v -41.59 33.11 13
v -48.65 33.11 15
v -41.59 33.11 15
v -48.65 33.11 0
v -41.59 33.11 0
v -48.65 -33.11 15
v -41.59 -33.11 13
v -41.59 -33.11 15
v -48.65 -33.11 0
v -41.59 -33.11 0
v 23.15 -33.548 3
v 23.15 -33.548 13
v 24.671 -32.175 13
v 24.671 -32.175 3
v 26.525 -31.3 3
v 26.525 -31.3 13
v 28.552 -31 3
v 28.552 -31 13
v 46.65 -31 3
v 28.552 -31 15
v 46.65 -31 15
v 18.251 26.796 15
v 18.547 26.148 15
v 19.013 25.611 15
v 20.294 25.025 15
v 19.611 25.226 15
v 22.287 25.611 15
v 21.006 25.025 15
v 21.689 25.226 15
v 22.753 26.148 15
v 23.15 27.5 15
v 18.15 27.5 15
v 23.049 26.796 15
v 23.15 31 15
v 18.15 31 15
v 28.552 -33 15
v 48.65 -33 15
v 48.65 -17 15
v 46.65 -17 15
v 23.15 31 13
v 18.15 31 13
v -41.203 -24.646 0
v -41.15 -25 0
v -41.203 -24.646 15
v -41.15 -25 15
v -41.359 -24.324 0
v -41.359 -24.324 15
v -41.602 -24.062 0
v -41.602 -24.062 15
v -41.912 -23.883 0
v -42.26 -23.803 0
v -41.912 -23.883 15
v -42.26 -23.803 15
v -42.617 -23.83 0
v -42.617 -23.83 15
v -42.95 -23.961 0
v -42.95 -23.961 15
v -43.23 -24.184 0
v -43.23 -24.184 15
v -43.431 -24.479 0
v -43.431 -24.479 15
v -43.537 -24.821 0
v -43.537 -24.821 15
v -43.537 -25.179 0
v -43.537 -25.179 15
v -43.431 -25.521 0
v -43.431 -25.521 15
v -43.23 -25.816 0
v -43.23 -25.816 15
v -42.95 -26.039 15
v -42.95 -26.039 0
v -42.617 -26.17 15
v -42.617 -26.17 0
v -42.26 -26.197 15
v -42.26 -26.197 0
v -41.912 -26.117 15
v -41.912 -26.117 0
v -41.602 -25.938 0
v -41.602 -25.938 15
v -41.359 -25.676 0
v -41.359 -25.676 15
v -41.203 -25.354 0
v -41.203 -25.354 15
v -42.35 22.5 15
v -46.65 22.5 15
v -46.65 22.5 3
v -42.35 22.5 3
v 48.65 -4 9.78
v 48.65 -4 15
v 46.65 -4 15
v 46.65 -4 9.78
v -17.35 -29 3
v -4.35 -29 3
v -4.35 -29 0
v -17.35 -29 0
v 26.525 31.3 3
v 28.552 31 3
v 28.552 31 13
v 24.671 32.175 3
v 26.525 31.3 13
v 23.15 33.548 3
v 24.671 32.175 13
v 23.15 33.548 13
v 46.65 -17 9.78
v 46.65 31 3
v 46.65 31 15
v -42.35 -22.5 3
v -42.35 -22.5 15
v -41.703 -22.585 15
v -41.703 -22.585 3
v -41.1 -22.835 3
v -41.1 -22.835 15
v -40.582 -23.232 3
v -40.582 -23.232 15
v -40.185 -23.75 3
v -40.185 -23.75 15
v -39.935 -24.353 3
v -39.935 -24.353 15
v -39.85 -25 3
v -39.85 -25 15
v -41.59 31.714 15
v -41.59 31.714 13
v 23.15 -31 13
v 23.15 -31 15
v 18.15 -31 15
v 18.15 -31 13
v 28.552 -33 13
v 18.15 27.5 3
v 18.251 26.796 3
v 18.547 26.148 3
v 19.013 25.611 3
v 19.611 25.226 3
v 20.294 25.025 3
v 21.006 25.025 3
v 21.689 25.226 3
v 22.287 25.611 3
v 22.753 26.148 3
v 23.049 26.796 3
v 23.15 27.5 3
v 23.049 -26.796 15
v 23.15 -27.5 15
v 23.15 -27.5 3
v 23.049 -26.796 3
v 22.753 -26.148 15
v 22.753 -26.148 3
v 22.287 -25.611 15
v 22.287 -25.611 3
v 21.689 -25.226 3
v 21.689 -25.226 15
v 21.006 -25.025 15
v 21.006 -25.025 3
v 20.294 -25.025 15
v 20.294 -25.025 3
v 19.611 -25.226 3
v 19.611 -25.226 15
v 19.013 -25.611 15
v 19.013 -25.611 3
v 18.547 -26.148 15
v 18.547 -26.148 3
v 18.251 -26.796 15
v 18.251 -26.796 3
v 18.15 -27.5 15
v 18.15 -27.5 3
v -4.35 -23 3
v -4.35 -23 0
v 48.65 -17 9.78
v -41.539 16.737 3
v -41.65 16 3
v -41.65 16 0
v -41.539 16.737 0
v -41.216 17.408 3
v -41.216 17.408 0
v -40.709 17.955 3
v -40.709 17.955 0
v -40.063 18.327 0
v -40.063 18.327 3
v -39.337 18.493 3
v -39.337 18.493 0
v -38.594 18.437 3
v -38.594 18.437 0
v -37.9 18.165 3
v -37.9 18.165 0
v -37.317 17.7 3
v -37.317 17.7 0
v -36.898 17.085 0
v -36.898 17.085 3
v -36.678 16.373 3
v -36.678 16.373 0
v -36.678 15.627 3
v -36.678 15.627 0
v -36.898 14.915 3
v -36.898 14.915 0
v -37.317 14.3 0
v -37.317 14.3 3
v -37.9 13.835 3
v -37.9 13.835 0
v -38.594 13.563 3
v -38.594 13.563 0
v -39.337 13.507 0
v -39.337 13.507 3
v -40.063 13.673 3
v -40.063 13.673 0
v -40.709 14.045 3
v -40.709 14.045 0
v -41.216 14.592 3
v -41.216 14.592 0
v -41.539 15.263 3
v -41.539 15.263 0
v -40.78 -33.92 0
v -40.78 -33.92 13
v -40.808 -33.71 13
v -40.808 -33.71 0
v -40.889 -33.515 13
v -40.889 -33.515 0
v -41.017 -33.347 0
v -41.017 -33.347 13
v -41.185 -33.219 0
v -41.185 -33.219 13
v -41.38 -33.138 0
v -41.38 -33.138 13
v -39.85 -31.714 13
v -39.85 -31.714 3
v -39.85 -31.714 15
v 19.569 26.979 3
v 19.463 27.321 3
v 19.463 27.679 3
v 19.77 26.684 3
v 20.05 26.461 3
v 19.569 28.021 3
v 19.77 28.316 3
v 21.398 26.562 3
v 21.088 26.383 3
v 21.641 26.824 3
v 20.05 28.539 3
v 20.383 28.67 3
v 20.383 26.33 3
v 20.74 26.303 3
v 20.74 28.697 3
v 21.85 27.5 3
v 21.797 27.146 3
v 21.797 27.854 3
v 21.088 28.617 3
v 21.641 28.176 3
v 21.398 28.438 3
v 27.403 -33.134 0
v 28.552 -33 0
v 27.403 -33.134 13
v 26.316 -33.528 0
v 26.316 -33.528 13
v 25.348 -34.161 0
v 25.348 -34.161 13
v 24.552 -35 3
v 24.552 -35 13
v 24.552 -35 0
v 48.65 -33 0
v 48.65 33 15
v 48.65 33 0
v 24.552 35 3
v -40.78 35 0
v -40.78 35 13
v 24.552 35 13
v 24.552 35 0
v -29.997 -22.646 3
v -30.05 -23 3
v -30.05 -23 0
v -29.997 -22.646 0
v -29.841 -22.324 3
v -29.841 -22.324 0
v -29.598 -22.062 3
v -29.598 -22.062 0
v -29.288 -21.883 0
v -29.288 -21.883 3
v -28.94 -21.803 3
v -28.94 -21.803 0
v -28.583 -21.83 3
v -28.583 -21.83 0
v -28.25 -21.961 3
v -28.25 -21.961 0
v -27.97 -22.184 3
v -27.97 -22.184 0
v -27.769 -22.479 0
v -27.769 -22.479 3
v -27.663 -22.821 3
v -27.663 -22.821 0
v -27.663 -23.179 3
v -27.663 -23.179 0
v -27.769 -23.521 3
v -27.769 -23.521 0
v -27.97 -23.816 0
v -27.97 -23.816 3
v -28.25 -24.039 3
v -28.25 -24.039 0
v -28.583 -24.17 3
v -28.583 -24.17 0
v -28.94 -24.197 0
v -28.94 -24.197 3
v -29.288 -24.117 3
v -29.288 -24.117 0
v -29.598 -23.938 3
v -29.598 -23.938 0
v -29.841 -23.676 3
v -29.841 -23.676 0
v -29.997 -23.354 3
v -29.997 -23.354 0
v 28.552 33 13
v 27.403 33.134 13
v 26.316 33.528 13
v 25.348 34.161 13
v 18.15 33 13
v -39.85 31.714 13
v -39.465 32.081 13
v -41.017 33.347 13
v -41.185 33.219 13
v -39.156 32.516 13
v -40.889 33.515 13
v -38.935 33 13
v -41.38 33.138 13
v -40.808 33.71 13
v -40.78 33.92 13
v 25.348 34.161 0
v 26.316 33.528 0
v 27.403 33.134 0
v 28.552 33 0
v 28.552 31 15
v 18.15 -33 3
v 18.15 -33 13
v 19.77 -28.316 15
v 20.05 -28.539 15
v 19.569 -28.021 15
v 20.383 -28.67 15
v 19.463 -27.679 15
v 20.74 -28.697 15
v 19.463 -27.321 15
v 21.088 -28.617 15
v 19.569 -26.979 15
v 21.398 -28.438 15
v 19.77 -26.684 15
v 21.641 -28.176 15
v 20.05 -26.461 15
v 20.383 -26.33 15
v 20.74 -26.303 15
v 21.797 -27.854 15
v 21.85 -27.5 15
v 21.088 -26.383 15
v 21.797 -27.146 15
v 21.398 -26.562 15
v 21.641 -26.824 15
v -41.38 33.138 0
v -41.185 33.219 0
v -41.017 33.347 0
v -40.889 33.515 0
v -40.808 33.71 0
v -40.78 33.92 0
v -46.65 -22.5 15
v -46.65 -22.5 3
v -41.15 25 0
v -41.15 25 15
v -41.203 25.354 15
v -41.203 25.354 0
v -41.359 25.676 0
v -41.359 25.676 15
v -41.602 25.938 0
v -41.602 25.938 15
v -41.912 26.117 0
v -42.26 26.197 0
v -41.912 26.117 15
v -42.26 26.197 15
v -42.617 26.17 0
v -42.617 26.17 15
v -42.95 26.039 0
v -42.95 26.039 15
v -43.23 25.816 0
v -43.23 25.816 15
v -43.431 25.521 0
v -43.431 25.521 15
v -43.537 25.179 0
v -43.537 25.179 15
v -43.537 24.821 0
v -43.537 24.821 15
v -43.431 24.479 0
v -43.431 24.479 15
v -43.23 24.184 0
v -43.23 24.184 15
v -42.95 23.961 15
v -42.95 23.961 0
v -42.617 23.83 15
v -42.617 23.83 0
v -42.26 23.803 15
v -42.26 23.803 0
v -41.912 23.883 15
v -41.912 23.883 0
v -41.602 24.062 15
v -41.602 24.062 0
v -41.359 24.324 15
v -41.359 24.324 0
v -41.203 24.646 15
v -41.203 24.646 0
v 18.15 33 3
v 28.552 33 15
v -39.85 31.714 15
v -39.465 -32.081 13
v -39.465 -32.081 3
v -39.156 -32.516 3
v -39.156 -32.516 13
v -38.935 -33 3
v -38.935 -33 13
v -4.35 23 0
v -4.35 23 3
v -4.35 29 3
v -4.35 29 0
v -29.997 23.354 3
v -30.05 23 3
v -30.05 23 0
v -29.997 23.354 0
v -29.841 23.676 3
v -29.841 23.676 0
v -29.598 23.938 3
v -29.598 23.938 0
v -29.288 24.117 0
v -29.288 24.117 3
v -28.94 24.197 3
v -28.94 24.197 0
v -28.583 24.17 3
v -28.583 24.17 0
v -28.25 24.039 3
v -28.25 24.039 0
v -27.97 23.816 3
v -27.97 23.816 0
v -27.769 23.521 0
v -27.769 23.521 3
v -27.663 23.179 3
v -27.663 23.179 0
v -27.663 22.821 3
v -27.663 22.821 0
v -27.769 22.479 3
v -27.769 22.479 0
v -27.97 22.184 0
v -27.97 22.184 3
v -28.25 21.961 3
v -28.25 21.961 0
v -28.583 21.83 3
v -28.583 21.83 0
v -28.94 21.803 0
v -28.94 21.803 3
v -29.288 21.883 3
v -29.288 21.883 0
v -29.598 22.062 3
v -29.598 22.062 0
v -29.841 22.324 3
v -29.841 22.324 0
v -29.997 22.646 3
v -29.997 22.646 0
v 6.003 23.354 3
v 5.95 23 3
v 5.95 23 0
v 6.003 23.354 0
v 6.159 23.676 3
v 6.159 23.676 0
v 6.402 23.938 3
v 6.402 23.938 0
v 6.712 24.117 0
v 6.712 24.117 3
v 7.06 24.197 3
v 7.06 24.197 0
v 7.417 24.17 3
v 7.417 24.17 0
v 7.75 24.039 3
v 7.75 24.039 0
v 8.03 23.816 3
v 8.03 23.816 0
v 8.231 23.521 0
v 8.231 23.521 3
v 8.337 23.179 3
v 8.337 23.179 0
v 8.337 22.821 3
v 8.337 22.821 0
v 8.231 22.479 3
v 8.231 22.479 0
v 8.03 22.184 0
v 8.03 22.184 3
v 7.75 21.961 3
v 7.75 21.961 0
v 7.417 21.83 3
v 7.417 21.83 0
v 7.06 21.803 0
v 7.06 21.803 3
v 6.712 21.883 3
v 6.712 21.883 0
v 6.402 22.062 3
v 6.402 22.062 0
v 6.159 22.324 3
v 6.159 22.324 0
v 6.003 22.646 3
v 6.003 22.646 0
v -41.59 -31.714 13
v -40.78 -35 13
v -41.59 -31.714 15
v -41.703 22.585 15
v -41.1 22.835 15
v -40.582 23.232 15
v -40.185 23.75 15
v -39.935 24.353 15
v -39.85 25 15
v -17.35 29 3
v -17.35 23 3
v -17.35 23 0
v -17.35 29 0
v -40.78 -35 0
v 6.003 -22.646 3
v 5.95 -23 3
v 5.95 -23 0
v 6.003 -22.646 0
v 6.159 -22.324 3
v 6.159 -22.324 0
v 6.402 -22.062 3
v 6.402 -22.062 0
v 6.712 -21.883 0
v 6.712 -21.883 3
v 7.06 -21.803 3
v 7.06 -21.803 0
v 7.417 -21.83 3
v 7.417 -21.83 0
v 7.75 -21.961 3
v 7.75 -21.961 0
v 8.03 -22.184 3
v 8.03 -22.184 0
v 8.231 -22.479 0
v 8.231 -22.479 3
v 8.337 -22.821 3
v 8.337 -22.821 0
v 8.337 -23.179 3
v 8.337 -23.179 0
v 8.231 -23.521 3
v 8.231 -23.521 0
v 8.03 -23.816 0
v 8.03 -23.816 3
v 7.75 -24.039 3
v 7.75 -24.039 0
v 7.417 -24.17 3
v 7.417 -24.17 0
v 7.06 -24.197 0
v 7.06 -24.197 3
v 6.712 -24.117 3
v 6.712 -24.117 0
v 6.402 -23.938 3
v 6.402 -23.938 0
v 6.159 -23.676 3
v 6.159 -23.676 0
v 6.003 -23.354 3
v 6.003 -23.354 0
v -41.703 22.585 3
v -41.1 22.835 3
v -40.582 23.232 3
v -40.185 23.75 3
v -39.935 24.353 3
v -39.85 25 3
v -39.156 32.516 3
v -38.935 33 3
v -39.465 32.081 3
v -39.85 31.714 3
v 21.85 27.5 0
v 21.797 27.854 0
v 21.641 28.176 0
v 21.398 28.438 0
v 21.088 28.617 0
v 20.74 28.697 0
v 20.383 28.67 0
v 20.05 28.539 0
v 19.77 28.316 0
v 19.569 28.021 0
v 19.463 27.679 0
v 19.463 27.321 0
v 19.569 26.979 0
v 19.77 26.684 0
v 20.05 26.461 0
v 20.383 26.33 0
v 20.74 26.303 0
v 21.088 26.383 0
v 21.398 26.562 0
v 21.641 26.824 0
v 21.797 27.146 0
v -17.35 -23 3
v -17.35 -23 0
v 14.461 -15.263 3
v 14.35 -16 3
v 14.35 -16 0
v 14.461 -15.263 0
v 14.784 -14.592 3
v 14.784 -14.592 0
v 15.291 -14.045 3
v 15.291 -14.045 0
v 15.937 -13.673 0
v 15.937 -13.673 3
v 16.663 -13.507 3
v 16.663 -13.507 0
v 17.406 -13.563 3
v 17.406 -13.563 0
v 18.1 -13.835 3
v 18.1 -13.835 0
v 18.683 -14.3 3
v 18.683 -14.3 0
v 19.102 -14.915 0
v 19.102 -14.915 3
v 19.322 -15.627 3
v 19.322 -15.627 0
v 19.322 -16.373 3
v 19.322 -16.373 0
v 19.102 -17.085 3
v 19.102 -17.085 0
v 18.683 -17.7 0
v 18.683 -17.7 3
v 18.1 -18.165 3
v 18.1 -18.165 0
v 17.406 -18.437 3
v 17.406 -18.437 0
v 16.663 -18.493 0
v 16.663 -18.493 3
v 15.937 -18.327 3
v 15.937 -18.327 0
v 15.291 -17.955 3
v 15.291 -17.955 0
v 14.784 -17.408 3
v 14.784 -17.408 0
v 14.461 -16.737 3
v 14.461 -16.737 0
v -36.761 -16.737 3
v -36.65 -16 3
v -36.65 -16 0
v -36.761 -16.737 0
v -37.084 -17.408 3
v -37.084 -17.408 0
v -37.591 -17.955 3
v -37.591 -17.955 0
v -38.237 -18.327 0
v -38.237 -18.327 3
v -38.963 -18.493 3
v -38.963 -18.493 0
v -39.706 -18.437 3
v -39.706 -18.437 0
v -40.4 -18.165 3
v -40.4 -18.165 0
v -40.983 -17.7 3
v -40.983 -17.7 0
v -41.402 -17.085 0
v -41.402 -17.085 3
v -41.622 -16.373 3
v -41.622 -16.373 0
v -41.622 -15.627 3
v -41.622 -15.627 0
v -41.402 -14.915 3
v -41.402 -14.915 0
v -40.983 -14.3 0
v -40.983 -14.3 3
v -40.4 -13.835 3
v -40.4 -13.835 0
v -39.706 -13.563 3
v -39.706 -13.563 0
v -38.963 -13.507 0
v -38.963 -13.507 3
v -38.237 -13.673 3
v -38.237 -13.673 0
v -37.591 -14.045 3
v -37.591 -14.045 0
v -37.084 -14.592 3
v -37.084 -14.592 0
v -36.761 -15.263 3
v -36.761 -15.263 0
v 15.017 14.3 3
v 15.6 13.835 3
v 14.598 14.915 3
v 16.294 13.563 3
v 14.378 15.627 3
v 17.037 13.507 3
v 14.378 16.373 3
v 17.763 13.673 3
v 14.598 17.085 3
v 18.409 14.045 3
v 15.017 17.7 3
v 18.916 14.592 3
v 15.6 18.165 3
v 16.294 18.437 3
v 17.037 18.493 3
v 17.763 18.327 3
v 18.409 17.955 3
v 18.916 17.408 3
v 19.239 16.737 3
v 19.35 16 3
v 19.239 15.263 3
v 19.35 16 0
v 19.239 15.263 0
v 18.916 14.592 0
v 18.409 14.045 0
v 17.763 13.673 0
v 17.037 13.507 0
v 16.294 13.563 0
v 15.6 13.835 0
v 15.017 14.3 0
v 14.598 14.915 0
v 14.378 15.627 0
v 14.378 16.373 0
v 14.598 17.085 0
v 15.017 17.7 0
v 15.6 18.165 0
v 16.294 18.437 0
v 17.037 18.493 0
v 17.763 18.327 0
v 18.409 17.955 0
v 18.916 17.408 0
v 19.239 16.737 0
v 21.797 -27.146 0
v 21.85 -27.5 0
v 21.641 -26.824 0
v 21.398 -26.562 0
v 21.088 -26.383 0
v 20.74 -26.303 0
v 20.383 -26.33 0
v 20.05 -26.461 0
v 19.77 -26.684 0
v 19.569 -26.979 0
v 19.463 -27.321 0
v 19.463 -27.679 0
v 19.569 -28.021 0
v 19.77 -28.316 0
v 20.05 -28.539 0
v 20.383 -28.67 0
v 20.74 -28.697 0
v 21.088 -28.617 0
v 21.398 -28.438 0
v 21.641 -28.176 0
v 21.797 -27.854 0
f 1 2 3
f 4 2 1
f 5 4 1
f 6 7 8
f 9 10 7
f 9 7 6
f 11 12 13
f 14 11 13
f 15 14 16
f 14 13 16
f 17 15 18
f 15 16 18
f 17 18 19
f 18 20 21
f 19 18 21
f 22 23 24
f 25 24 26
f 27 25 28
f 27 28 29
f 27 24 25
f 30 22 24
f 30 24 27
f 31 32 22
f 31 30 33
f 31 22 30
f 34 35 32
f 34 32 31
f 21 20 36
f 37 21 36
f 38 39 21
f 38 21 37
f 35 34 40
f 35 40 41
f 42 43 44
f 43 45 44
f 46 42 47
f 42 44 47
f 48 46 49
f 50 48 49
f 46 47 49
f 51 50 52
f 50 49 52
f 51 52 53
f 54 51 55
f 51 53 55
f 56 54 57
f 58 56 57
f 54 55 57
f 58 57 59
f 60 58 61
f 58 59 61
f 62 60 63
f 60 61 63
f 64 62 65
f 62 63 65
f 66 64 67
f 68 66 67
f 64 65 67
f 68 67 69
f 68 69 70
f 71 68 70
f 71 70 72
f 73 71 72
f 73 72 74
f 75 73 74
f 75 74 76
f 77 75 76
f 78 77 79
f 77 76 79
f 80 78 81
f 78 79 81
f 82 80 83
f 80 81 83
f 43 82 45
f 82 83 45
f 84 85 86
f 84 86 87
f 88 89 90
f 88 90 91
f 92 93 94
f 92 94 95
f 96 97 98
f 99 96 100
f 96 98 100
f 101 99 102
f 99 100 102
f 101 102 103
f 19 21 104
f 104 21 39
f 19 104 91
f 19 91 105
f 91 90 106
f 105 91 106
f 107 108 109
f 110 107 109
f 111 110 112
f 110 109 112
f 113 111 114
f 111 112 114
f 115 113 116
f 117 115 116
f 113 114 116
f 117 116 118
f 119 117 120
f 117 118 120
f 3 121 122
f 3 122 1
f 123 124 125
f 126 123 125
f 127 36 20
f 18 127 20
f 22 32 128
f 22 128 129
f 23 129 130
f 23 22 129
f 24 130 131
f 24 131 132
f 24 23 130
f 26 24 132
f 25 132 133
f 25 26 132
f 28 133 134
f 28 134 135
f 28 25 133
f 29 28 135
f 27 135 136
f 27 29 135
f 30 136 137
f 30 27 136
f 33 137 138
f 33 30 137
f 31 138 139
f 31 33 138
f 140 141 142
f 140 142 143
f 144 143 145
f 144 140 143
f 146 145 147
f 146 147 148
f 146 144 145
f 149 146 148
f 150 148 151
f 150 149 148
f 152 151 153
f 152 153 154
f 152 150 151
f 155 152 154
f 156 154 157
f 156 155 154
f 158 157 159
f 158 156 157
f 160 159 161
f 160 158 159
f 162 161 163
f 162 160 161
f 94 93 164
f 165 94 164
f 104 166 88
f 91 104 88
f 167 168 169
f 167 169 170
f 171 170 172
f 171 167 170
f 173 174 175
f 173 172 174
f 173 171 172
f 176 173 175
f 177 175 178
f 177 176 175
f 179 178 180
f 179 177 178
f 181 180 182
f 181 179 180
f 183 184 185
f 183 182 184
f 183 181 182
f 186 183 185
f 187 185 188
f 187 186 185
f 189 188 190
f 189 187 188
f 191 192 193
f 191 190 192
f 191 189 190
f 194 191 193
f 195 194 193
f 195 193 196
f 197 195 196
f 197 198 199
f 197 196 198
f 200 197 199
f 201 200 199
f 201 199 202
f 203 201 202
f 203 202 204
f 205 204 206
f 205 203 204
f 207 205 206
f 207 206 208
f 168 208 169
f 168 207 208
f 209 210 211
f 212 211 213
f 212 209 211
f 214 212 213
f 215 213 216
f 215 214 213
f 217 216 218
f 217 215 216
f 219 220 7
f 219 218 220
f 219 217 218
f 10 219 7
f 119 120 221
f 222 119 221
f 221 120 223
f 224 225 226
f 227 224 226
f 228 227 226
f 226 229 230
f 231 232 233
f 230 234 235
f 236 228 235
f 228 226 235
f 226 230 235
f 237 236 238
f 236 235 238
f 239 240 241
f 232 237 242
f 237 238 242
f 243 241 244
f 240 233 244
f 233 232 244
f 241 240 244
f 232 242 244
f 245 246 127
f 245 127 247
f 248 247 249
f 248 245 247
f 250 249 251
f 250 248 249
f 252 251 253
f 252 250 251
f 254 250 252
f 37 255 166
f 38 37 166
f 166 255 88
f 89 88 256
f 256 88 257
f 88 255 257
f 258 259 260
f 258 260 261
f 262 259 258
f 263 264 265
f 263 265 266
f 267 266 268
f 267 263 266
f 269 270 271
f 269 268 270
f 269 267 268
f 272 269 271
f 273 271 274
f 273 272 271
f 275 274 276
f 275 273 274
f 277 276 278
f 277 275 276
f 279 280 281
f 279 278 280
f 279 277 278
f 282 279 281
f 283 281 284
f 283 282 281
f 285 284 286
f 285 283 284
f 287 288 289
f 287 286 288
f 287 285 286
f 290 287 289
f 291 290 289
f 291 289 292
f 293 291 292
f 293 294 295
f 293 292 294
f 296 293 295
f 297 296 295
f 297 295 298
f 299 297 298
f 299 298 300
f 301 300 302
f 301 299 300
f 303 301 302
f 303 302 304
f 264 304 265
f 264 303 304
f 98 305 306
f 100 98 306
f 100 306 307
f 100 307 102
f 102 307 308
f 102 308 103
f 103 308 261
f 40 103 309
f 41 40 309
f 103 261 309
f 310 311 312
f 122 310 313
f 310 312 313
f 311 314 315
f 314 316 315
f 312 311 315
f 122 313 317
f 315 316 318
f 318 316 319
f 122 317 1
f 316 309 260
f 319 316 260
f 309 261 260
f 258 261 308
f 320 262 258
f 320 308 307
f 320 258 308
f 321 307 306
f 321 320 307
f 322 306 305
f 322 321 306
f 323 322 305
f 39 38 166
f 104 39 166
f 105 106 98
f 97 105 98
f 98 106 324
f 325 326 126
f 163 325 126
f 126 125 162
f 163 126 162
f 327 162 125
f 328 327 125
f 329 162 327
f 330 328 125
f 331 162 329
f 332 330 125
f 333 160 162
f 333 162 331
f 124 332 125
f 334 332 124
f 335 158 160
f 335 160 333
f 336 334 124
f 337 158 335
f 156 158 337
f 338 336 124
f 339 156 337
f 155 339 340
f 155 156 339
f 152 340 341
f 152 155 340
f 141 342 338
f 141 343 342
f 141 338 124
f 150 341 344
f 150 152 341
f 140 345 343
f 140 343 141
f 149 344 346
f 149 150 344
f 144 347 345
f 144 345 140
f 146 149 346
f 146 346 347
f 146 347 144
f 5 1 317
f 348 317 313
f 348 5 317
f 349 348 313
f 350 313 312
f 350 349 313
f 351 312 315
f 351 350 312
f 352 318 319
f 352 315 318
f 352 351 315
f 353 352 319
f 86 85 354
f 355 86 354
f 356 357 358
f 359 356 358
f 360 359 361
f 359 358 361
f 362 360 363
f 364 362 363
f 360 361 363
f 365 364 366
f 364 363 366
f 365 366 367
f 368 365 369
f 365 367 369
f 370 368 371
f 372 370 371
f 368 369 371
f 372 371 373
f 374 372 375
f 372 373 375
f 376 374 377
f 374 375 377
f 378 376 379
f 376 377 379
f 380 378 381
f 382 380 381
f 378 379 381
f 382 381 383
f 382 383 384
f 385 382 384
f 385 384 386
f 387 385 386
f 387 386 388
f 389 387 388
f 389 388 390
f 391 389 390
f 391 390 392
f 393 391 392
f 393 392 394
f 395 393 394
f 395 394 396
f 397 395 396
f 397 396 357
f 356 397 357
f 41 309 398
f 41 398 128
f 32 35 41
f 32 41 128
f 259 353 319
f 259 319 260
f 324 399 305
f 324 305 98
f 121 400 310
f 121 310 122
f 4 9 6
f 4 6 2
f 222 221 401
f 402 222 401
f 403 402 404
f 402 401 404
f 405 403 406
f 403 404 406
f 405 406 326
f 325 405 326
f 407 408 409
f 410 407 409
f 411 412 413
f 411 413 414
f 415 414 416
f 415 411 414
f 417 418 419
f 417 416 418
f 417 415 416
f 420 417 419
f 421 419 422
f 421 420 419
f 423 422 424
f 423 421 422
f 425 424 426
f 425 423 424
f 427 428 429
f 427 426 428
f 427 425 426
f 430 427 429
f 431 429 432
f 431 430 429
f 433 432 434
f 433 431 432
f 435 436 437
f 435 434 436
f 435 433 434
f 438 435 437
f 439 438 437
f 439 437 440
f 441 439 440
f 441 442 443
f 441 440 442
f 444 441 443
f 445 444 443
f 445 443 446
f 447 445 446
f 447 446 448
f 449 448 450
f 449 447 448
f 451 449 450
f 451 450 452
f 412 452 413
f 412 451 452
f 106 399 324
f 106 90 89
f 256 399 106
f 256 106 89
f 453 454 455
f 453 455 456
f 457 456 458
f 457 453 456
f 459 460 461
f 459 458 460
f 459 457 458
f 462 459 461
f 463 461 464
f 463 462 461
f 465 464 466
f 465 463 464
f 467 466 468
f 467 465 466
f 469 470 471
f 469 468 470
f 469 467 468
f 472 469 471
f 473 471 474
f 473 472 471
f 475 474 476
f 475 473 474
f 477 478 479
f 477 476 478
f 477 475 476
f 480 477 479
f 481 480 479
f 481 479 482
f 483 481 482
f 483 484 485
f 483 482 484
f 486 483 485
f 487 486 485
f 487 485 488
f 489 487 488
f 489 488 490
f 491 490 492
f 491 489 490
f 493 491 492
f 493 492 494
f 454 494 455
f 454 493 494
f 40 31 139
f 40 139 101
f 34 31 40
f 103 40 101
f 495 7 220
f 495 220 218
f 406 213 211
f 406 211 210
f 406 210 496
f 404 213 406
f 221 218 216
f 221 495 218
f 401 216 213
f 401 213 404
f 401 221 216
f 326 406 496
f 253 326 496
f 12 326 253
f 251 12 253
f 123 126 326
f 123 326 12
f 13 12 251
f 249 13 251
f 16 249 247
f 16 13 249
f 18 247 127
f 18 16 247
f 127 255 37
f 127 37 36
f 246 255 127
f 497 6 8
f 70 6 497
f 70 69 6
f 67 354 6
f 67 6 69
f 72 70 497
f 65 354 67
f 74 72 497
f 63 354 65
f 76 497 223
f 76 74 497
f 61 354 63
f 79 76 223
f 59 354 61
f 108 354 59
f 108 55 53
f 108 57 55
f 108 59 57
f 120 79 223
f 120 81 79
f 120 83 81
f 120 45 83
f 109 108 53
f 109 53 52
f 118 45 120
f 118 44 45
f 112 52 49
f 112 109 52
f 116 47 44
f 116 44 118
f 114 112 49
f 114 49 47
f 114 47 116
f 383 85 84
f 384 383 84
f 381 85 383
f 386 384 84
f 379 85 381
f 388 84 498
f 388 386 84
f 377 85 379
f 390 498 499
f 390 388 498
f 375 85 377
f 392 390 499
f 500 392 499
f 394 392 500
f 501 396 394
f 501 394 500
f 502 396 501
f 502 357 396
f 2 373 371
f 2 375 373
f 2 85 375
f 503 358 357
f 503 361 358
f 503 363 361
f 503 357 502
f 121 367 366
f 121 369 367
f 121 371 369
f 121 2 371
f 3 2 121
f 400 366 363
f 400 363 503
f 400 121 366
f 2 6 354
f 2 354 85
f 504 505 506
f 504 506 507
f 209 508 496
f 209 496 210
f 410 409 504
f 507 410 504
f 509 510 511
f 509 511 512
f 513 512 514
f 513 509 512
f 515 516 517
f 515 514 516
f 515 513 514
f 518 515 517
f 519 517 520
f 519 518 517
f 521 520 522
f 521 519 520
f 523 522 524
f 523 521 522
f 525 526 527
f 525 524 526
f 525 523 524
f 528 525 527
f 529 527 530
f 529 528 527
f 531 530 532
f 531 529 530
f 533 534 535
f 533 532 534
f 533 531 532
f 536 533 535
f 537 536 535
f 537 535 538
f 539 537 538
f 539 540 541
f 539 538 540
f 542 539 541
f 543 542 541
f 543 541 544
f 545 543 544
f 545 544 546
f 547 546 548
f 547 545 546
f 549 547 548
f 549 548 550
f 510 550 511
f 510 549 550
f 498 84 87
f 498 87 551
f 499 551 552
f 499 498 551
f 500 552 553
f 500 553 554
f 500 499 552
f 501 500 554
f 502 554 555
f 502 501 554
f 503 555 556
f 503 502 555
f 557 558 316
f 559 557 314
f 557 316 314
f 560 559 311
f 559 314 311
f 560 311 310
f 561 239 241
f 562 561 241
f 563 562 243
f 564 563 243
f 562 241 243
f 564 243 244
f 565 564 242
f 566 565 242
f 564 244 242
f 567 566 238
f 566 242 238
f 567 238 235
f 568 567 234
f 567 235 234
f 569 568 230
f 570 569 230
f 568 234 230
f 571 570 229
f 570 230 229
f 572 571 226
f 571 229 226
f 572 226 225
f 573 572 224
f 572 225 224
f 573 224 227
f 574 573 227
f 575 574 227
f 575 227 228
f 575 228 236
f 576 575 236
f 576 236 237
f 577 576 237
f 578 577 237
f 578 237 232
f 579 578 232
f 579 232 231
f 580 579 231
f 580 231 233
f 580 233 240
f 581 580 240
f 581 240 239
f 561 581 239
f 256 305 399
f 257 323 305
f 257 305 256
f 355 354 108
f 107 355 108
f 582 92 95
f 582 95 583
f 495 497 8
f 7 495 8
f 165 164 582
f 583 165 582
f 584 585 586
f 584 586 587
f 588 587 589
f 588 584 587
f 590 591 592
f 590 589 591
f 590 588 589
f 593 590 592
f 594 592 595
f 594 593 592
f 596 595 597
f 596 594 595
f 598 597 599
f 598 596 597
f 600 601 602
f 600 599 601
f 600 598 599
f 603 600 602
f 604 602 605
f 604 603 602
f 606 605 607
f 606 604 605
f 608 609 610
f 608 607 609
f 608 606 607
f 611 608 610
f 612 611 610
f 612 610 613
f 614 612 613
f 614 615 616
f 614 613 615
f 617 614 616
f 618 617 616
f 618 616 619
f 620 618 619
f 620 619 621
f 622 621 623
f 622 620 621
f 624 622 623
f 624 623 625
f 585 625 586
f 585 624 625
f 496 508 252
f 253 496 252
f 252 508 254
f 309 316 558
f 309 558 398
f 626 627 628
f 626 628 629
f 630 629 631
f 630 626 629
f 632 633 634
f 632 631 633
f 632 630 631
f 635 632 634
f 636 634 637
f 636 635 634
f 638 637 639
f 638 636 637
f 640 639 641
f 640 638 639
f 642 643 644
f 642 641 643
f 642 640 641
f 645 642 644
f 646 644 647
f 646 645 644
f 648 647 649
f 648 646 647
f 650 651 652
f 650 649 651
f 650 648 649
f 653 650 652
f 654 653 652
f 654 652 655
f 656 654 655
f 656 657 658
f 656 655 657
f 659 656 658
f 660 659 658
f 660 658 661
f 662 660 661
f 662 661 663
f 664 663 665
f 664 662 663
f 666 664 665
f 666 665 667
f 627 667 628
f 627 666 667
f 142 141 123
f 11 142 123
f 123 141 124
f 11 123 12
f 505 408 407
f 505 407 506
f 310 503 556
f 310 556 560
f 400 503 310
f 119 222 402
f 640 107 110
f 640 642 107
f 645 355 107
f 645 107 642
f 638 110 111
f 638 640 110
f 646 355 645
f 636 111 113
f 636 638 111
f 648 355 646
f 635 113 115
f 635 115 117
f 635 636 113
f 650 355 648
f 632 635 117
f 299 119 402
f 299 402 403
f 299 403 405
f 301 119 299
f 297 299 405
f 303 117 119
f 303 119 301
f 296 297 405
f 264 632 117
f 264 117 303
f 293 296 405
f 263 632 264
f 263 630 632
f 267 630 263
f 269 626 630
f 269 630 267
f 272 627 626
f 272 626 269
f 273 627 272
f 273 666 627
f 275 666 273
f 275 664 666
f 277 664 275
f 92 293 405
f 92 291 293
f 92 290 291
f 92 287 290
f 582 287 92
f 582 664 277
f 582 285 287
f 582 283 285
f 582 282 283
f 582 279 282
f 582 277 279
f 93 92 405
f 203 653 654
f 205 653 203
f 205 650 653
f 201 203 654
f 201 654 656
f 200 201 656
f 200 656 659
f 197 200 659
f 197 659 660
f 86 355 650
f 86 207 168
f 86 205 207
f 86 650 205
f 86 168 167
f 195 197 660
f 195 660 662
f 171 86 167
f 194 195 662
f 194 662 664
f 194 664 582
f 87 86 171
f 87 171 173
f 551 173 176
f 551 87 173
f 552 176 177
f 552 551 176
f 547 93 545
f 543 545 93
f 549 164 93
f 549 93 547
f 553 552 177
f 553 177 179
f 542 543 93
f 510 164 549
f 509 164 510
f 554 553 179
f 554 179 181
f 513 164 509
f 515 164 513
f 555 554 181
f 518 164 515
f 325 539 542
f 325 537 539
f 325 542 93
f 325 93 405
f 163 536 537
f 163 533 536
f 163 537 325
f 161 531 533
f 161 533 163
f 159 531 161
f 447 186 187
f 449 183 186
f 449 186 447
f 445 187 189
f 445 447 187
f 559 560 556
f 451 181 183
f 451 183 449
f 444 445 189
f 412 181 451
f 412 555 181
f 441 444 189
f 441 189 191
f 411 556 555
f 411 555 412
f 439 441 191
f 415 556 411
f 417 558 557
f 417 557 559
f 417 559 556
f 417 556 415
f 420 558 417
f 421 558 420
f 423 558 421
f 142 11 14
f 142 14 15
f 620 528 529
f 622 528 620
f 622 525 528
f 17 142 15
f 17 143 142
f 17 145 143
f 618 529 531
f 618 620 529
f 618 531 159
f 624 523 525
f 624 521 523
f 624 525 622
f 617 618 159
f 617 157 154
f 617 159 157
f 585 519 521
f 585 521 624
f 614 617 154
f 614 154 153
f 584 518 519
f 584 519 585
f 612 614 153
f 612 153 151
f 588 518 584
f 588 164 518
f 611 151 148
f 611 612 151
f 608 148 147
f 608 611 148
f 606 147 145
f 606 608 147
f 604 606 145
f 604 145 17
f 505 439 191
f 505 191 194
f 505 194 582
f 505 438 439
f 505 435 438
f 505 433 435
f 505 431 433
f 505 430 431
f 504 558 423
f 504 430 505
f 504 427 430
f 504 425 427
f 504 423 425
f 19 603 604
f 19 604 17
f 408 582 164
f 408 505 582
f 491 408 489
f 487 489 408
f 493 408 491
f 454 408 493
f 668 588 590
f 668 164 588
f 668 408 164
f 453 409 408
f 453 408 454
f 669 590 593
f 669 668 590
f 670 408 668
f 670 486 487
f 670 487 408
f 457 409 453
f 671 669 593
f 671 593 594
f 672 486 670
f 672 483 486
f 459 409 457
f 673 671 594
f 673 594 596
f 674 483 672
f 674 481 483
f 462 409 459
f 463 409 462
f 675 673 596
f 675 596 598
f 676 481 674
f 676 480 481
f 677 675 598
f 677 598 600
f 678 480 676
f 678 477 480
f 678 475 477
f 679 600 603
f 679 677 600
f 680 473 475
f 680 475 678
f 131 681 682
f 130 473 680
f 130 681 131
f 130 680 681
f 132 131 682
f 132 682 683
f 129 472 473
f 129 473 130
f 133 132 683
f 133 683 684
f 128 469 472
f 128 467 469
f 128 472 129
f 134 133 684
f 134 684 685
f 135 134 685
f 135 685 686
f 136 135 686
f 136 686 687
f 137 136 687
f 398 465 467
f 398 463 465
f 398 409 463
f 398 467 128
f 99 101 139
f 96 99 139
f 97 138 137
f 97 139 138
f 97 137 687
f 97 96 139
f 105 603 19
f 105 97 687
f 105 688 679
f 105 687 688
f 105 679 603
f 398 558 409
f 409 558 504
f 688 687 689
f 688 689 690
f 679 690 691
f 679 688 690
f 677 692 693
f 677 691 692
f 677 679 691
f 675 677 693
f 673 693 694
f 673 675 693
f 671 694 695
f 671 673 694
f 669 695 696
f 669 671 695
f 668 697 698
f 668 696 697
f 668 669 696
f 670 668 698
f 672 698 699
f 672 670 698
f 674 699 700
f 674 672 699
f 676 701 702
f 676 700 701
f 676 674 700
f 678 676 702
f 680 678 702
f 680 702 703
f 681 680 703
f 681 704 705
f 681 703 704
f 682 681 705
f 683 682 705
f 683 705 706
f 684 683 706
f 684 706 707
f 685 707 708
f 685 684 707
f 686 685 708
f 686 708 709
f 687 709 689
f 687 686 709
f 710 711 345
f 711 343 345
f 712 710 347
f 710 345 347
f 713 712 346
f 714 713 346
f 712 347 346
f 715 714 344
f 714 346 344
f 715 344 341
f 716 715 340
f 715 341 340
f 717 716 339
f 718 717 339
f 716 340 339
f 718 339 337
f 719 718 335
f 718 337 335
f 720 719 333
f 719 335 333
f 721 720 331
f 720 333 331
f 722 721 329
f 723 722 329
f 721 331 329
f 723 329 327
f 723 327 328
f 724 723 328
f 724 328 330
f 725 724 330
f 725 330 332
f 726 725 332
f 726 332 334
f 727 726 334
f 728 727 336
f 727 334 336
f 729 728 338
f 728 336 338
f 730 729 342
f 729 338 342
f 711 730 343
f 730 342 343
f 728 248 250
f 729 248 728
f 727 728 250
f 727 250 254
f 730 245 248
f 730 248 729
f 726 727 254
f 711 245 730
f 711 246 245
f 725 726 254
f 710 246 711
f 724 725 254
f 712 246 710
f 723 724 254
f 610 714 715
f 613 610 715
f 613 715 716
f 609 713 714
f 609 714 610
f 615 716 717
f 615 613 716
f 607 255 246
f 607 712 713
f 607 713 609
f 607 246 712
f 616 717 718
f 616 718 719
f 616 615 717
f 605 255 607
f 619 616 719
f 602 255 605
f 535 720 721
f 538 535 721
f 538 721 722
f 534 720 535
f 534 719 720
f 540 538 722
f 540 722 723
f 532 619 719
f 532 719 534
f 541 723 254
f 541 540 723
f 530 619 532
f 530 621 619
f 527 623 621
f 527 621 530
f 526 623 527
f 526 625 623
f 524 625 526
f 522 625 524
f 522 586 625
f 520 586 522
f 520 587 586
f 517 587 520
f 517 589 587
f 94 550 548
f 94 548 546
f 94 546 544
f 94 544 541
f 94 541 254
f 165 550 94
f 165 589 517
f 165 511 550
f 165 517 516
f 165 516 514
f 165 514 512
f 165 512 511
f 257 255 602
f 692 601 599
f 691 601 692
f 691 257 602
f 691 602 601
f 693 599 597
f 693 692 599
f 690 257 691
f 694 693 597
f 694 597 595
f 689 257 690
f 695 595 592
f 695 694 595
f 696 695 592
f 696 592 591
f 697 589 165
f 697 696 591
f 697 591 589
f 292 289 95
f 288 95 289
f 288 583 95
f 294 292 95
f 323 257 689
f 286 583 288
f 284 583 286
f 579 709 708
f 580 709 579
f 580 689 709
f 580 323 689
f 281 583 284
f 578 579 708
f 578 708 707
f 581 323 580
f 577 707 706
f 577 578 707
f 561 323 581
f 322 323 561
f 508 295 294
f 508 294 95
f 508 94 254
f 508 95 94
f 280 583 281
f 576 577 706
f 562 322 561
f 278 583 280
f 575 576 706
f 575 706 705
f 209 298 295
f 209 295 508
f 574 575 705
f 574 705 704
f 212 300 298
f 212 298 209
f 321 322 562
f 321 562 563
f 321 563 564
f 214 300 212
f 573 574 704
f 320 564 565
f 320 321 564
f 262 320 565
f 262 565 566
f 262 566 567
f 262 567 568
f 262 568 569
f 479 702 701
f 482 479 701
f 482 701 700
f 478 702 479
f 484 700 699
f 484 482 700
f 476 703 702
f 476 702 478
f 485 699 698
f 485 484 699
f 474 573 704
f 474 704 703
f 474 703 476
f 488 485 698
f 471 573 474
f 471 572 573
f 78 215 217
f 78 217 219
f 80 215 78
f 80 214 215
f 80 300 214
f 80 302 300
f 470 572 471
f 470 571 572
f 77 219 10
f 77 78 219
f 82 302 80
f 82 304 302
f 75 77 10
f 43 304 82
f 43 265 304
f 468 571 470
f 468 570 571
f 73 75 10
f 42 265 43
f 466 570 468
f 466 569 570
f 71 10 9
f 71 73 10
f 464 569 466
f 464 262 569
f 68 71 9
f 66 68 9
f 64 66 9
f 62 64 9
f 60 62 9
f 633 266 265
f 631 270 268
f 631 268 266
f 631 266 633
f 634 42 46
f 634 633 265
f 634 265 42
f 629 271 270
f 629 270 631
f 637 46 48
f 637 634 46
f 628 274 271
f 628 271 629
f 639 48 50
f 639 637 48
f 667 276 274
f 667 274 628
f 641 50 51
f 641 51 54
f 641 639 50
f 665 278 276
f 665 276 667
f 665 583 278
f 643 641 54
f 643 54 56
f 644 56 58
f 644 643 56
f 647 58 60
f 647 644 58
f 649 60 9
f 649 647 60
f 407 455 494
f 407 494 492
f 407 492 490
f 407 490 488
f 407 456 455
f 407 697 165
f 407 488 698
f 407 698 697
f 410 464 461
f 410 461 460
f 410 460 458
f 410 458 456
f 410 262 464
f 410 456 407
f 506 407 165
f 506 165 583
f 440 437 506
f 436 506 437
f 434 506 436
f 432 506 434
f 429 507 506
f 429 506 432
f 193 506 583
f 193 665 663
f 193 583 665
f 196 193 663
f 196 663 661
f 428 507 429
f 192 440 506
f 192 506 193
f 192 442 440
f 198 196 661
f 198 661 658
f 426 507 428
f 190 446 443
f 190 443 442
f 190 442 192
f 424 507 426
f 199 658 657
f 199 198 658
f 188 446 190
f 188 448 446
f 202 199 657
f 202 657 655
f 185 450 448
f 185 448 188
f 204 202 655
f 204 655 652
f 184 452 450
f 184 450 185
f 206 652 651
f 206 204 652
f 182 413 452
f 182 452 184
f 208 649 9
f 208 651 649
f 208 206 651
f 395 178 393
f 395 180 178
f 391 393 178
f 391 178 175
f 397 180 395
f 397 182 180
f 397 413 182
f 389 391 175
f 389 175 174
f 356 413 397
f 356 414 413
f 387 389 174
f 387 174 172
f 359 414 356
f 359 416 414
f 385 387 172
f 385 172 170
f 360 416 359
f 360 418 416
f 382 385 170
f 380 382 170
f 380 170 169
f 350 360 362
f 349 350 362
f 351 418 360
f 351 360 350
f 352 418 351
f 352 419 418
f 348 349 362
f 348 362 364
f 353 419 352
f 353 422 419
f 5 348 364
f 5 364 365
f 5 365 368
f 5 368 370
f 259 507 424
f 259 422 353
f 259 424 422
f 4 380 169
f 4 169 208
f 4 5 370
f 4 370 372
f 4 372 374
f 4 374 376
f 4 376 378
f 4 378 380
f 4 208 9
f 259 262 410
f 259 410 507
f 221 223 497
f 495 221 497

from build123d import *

# Parameters (mm, degrees)
SKIZZE1_W                            = 12
SKIZZE1_H                            = 77.4
AUFSATZ_LINEAR_AUSTRAGEN1_DEPTH      = 15
SCHNITT_LINEAR_AUSTRAGEN1_DEPTH      = 12
SKIZZE3_R                            = 1.2
SCHNITT_LINEAR_AUSTRAGEN2_DEPTH      = 10
SKIZZE4_W                            = 5.22
SKIZZE4_H                            = 13
SCHNITT_LINEAR_AUSTRAGEN3_DEPTH      = 5
SCHNITT_LINEAR_AUSTRAGEN4_DEPTH      = 64.949296321
SCHNITT_LINEAR_AUSTRAGEN4_DEPTH_BACK = 64.949296321
SKIZZE5_R                            = 1.2
SCHNITT_LINEAR_AUSTRAGEN5_DEPTH      = 64.949296321
SCHNITT_LINEAR_AUSTRAGEN5_DEPTH_BACK = 64.949296321
SKIZZE6_R                            = 2.5
SCHNITT_LINEAR_AUSTRAGEN6_DEPTH      = 64.949296321
SCHNITT_LINEAR_AUSTRAGEN6_DEPTH_BACK = 64.949296321
SKIZZE7_W                            = 13
SKIZZE7_H                            = 6
AUFSATZ_LINEAR_START                 = 12
SKIZZE8_R                            = 2.5
SKIZZE8_R_2                          = 1.200003308
SKIZZE8_R_3                          = 1.2
AUFSATZ_LINEAR_AUSTRAGEN2_DEPTH      = 12
SKIZZE9_R                            = 1.2
SKIZZE9_R_2                          = 1.200003308
AUFSATZ_LINEAR_AUSTRAGEN3_DEPTH      = 12
SCHNITT_LINEAR_AUSTRAGEN7_DEPTH      = 64.949296321
SCHNITT_LINEAR_AUSTRAGEN7_DEPTH_BACK = 64.949296321
SKIZZE10_W                           = 76.97303699
SKIZZE10_H                           = 5.16089798
SCHNITT_LINEAR_AUSTRAGEN8_DEPTH      = 2


with BuildPart() as part:
    # Skizze1 → Aufsatz-Linear austragen1 (new body)
    with BuildSketch(Plane.XY):
        with BuildLine():
            ThreePointArc((-40.78, -33.92), (-41.017243507, -33.347243507), (-41.59, -33.11))
            Line((-41.59, -33.11), (-48.65, -33.11))
            Line((-48.65, -33.11), (-48.65, 33.11))
            Line((-48.65, 33.11), (-41.59, 33.11))
            ThreePointArc((-41.59, 33.11), (-41.017243507, 33.347243507), (-40.78, 33.92))
            Line((-40.78, 33.92), (-40.78, 38.7))
            Line((-40.78, 38.7), (-39.35, 38.7))
            Line((-39.35, 38.7), (-39.35, -38.7))
            Line((-39.35, -38.7), (-40.78, -38.7))
            Line((-40.78, -38.7), (-40.78, -33.92))
        make_face()
        with Locations((-33.35, 0)):
            Rectangle(SKIZZE1_W, SKIZZE1_H)
        with BuildLine():
            ThreePointArc((9.355872211, 33.3), (8.489846807, 33.224428901), (7.65, 33))
            Line((7.65, 33), (-24.35, 33))
            Line((-24.35, 33), (-24.35, -33))
            Line((-24.35, -33), (7.65, -33))
            ThreePointArc((7.65, -33), (8.489846807, -33.224428901), (9.355872211, -33.3))
            Line((9.355872211, -33.3), (17.45, -33.3))
            Line((17.45, -33.3), (17.45, -24))
            Line((17.45, -24), (23.85, -24))
            Line((23.85, -24), (23.85, -30))
            Line((23.85, -30), (34.2, -30))
            Line((34.2, -30), (45.65, -30))
            Line((45.65, -30), (45.65, 3))
            Line((45.65, 3), (48.65, 3))
            Line((48.65, 3), (48.65, -33))
            Line((48.65, -33), (34.2, -33))
            Line((34.2, -33), (28.552127178, -33))
            ThreePointArc((28.552127178, -33), (25.679845855, -33.907323614), (23.85, -36.3))
            Line((23.85, -36.3), (5.65, -36.3))
            ThreePointArc((5.65, -36.3), (4.089741294, -35.336310473), (2.286965656, -35))
            Line((2.286965656, -35), (-20.521956918, -35))
            ThreePointArc((-20.521956918, -35), (-23.563338183, -36.031373033), (-25.35, -38.7))
            Line((-25.35, -38.7), (-27.35, -38.7))
            Line((-27.35, -38.7), (-27.35, 38.7))
            Line((-27.35, 38.7), (-25.35, 38.7))
            ThreePointArc((-25.35, 38.7), (-23.563338183, 36.031373033), (-20.521956918, 35))
            Line((-20.521956918, 35), (2.286965656, 35))
            ThreePointArc((2.286965656, 35), (4.089741294, 35.336310473), (5.65, 36.3))
            Line((5.65, 36.3), (23.85, 36.3))
            ThreePointArc((23.85, 36.3), (25.679845855, 33.907323614), (28.552127178, 33))
            Line((28.552127178, 33), (34.2, 33))
            Line((34.2, 33), (48.65, 33))
            Line((48.65, 33), (48.65, 18))
            Line((48.65, 18), (45.65, 18))
            Line((45.65, 18), (45.65, 30))
            Line((45.65, 30), (34.2, 30))
            Line((34.2, 30), (23.85, 30))
            Line((23.85, 30), (23.85, 24))
            Line((23.85, 24), (17.45, 24))
            Line((17.45, 24), (17.45, 33.3))
            Line((17.45, 33.3), (9.355872211, 33.3))
        make_face()
        with BuildLine():
            Line((9.355872211, 33.3), (17.45, 33.3))
            Line((17.45, 33.3), (17.45, 24))
            Line((17.45, 24), (23.85, 24))
            Line((23.85, 24), (23.85, 30))
            Line((23.85, 30), (34.2, 30))
            Line((34.2, 30), (45.65, 30))
            Line((45.65, 30), (45.65, 18))
            Line((45.65, 18), (48.65, 18))
            Line((48.65, 18), (48.65, 3))
            Line((48.65, 3), (45.65, 3))
            Line((45.65, 3), (45.65, -30))
            Line((45.65, -30), (34.2, -30))
            Line((34.2, -30), (23.85, -30))
            Line((23.85, -30), (23.85, -24))
            Line((23.85, -24), (17.45, -24))
            Line((17.45, -24), (17.45, -33.3))
            Line((17.45, -33.3), (9.355872211, -33.3))
            ThreePointArc((9.355872211, -33.3), (8.489846807, -33.224428901), (7.65, -33))
            Line((7.65, -33), (-24.35, -33))
            Line((-24.35, -33), (-24.35, 33))
            Line((-24.35, 33), (7.65, 33))
            ThreePointArc((7.65, 33), (8.489846807, 33.224428901), (9.355872211, 33.3))
        make_face()
    extrude(amount=AUFSATZ_LINEAR_AUSTRAGEN1_DEPTH)

    # Skizze2 → Schnitt-Linear austragen1 (cut)
    with BuildSketch(Plane.XY.offset(15)):
        with BuildLine():
            Line((46.65, -31), (46.65, 31))
            Line((46.65, 31), (28.552127178, 31))
            ThreePointArc((28.552127178, 31), (25.153598085, 31.880359488), (22.609905372, 34.3))
            Line((22.609905372, 34.3), (6.350215587, 34.3))
            ThreePointArc((6.350215587, 34.3), (4.420038557, 33.33291668), (2.286965656, 33))
            Line((2.286965656, 33), (-20.521956918, 33))
            ThreePointArc((-20.521956918, 33), (-24.120567761, 33.995834779), (-26.695286652, 36.7))
            Line((-26.695286652, 36.7), (-38.78, 36.7))
            Line((-38.78, 36.7), (-38.78, 33.92))
            ThreePointArc((-38.78, 33.92), (-39.603029945, 31.933029945), (-41.59, 31.11))
            Line((-41.59, 31.11), (-46.65, 31.11))
            Line((-46.65, 31.11), (-46.65, -31.11))
            Line((-46.65, -31.11), (-41.59, -31.11))
            ThreePointArc((-41.59, -31.11), (-39.603029945, -31.933029945), (-38.78, -33.92))
            Line((-38.78, -33.92), (-38.78, -36.7))
            Line((-38.78, -36.7), (-26.695286652, -36.7))
            ThreePointArc((-26.695286652, -36.7), (-24.120567761, -33.995834779), (-20.521956918, -33))
            Line((-20.521956918, -33), (2.286965656, -33))
            ThreePointArc((2.286965656, -33), (4.420038557, -33.33291668), (6.350215587, -34.3))
            Line((6.350215587, -34.3), (22.609905372, -34.3))
            ThreePointArc((22.609905372, -34.3), (25.153598085, -31.880359488), (28.552127178, -31))
            Line((28.552127178, -31), (46.65, -31))
        make_face()
    extrude(amount=-SCHNITT_LINEAR_AUSTRAGEN1_DEPTH, mode=Mode.SUBTRACT)

    # Skizze3 → Schnitt-Linear austragen2 (cut)
    with BuildSketch(Plane.XY.offset(3)):
        with Locations((-42.35, 25)):
            Circle(SKIZZE3_R)
        with Locations((20.650001099, 27.499992502)):
            Circle(SKIZZE3_R)
        with Locations((20.650001099, -27.499992502)):
            Circle(SKIZZE3_R)
        with Locations((-42.35, -25)):
            Circle(SKIZZE3_R)
    extrude(amount=-SCHNITT_LINEAR_AUSTRAGEN2_DEPTH, mode=Mode.SUBTRACT)

    # Skizze4 → Schnitt-Linear austragen3 (cut)
    with BuildSketch(Plane(origin=(48.65, 0, 0), x_dir=(0, 0, -1), z_dir=(1, 0, 0))):
        with Locations((-12.39, -10.5)):
            Rectangle(SKIZZE4_W, SKIZZE4_H)
    extrude(amount=-SCHNITT_LINEAR_AUSTRAGEN3_DEPTH, mode=Mode.SUBTRACT)

    # Skizze5 → Schnitt-Linear austragen4 (cut, two sides: drawn at the far end of the back side and taken through both)
    with BuildSketch(Plane(origin=(0, 0, 0), x_dir=(-1, 0, 0), z_dir=(0, 0, -1)).offset(-SCHNITT_LINEAR_AUSTRAGEN4_DEPTH_BACK)):
        with Locations((-7.15000055, 23)):
            Circle(SKIZZE5_R)
        with Locations((28.84999945, 23)):
            Circle(SKIZZE5_R)
        with Locations((-7.15000055, -23)):
            Circle(SKIZZE5_R)
        with Locations((28.84999945, -23)):
            Circle(SKIZZE5_R)
    extrude(amount=SCHNITT_LINEAR_AUSTRAGEN4_DEPTH + SCHNITT_LINEAR_AUSTRAGEN4_DEPTH_BACK, mode=Mode.SUBTRACT)

    # Skizze6 → Schnitt-Linear austragen5 (cut, two sides: drawn at the far end of the back side and taken through both)
    with BuildSketch(Plane(origin=(0, 0, 0), x_dir=(-1, 0, 0), z_dir=(0, 0, -1)).offset(-SCHNITT_LINEAR_AUSTRAGEN5_DEPTH_BACK)):
        with Locations((-16.85, -16)):
            Circle(SKIZZE6_R)
        with Locations(Location((-16.85, 16, 0), (0, 0, 180))):
            Circle(SKIZZE6_R)
        with Locations((39.15, 16)):
            Circle(SKIZZE6_R)
        with Locations(Location((39.15, -16, 0), (0, 0, 180))):
            Circle(SKIZZE6_R)
    extrude(amount=SCHNITT_LINEAR_AUSTRAGEN5_DEPTH + SCHNITT_LINEAR_AUSTRAGEN5_DEPTH_BACK, mode=Mode.SUBTRACT)

    # Skizze7 → Schnitt-Linear austragen6 (cut, two sides: drawn at the far end of the back side and taken through both)
    with BuildSketch(Plane(origin=(0, 0, 0), x_dir=(-1, 0, 0), z_dir=(0, 0, -1)).offset(-SCHNITT_LINEAR_AUSTRAGEN6_DEPTH_BACK)):
        with Locations((10.84999945, -26)):
            Rectangle(SKIZZE7_W, SKIZZE7_H)
        with Locations((10.84999945, 26)):
            Rectangle(SKIZZE7_W, SKIZZE7_H)
    extrude(amount=SCHNITT_LINEAR_AUSTRAGEN6_DEPTH + SCHNITT_LINEAR_AUSTRAGEN6_DEPTH_BACK, mode=Mode.SUBTRACT)

    # Skizze8 → Aufsatz-Linear austragen2 (add)
    # profile 1 of 4: a face of its own
    with BuildSketch(Plane.XY.offset(3).offset(AUFSATZ_LINEAR_START)):
        with Locations((-42.35, 25)):
            Circle(SKIZZE8_R)
        with Locations((-42.35, 25)):
            Circle(SKIZZE8_R_2, mode=Mode.SUBTRACT)
    # profile 2 of 4: a face of its own
    with BuildSketch(Plane.XY.offset(3).offset(AUFSATZ_LINEAR_START)):
        with Locations(Location((-42.35, -25, 0), (0, 0, 180))):
            Circle(SKIZZE8_R)
        with Locations((-42.35, -25)):
            Circle(SKIZZE8_R_2, mode=Mode.SUBTRACT)
    # profile 3 of 4: a face of its own
    with BuildSketch(Plane.XY.offset(3).offset(AUFSATZ_LINEAR_START)):
        with Locations((20.650001099, 27.499992502)):
            Circle(SKIZZE8_R)
        with Locations((20.650001099, 27.499992502)):
            Circle(SKIZZE8_R_3, mode=Mode.SUBTRACT)
    # profile 4 of 4: a face of its own
    with BuildSketch(Plane.XY.offset(3).offset(AUFSATZ_LINEAR_START)):
        with Locations(Location((20.650001099, -27.499992502, 0), (0, 0, 180))):
            Circle(SKIZZE8_R)
        with Locations((20.650001099, -27.499992502)):
            Circle(SKIZZE8_R_3, mode=Mode.SUBTRACT)
    extrude(amount=-AUFSATZ_LINEAR_AUSTRAGEN2_DEPTH)

    # Skizze9 → Aufsatz-Linear austragen3 (add)
    # profile 1 of 6: a face of its own
    with BuildSketch(Plane.XY.offset(3).offset(AUFSATZ_LINEAR_START)):
        with BuildLine():
            Line((-39.85, 25), (-39.85, 31.933029945))
            Line((-39.85, 31.933029945), (-46.65, 31.933029945))
            Line((-46.65, 31.933029945), (-46.65, 22.5))
            Line((-46.65, 22.5), (-42.35, 22.5))
            ThreePointArc((-42.35, 22.5), (-40.582233047, 23.232233047), (-39.85, 25))
        make_face()
        with Locations((-42.35, 25)):
            Circle(SKIZZE9_R, mode=Mode.SUBTRACT)
    # profile 2 of 6: a face of its own
    with BuildSketch(Plane.XY.offset(3).offset(AUFSATZ_LINEAR_START)):
        with BuildLine():
            Line((18.150001099, 33), (18.150001099, 27.499992502))
            ThreePointArc((18.150001099, 27.499992502), (20.650001099, 24.999992502), (23.150001099, 27.499992502))
            Line((23.150001099, 27.499992502), (23.150001099, 34.3))
            Line((23.150001099, 34.3), (24.552127178, 34.3))
            Line((24.552127178, 34.3), (24.552127178, 35))
            Line((24.552127178, 35), (2.286965656, 35))
            Line((2.286965656, 35), (2.286965656, 33))
            Line((2.286965656, 33), (18.150001099, 33))
        make_face()
    # profile 3 of 6: a face of its own
    with BuildSketch(Plane.XY.offset(3).offset(AUFSATZ_LINEAR_START)):
        with BuildLine():
            Line((-46.65, -22.5), (-42.35, -22.5))
            ThreePointArc((-42.35, -22.5), (-40.582233047, -23.232233047), (-39.85, -25))
            Line((-39.85, -25), (-39.85, -31.933029945))
            Line((-39.85, -31.933029945), (-46.65, -31.933029945))
            Line((-46.65, -31.933029945), (-46.65, -22.5))
        make_face()
        with Locations((-42.35, -25)):
            Circle(SKIZZE9_R, mode=Mode.SUBTRACT)
    # profile 4 of 6: a face of its own
    with BuildSketch(Plane.XY.offset(3).offset(AUFSATZ_LINEAR_START)):
        Polygon((-20.521956918, -33), (-38.934872884, -33), (-38.78, -35), (-20.521956918, -35), align=None)
    # profile 5 of 6: a face of its own
    with BuildSketch(Plane.XY.offset(3).offset(AUFSATZ_LINEAR_START)):
        Polygon((-20.521956918, 33), (-20.521956918, 35), (-38.78, 35), (-38.934872884, 33), align=None)
    # profile 6 of 6: a face of its own
    with BuildSketch(Plane.XY.offset(3).offset(AUFSATZ_LINEAR_START)):
        with BuildLine():
            Line((2.286965656, -35), (2.286965656, -33))
            Line((2.286965656, -33), (18.150001099, -33))
            Line((18.150001099, -33), (18.150001099, -27.499992502))
            ThreePointArc((18.150001099, -27.499992502), (20.650001099, -24.999992502), (23.150001099, -27.499992502))
            Line((23.150001099, -27.499992502), (23.150001099, -34.3))
            Line((23.150001099, -34.3), (24.552127178, -34.3))
            Line((24.552127178, -34.3), (24.552127178, -35))
            Line((24.552127178, -35), (2.286965656, -35))
        make_face()
        with Locations((20.650001099, -27.499992502)):
            Circle(SKIZZE9_R_2, mode=Mode.SUBTRACT)
    extrude(amount=-AUFSATZ_LINEAR_AUSTRAGEN3_DEPTH)

    # Skizze10 → Schnitt-Linear austragen7 (cut, two sides: drawn at the far end of the back side and taken through both)
    with BuildSketch(Plane.XY.offset(15).offset(-SCHNITT_LINEAR_AUSTRAGEN7_DEPTH_BACK)):
        with Locations((-2.293481505, 37.58044899)):
            Rectangle(SKIZZE10_W, SKIZZE10_H)
        with Locations((-2.293481505, -37.58044899)):
            Rectangle(SKIZZE10_W, SKIZZE10_H)
    extrude(amount=SCHNITT_LINEAR_AUSTRAGEN7_DEPTH + SCHNITT_LINEAR_AUSTRAGEN7_DEPTH_BACK, mode=Mode.SUBTRACT)

    # Skizze11 → Schnitt-Linear austragen8 (cut)
    with BuildSketch(Plane.XY.offset(15)):
        Polygon((-41.59, 31.713532235), (-41.59, 35), (28.552127178, 35), (28.552127178, 31), (18.150001099, 31), (18.150001099, 33), (-38.934872884, 33), (-38.934872884, 31.713532235), align=None)
        Polygon((-38.934872884, -33), (-38.934872884, -31.713532235), (-41.59, -31.713532235), (-41.59, -35), (28.552127178, -35), (28.552127178, -31), (18.150001099, -31), (18.150001099, -33), align=None)
    extrude(amount=-SCHNITT_LINEAR_AUSTRAGEN8_DEPTH, mode=Mode.SUBTRACT)


solid = part.part
